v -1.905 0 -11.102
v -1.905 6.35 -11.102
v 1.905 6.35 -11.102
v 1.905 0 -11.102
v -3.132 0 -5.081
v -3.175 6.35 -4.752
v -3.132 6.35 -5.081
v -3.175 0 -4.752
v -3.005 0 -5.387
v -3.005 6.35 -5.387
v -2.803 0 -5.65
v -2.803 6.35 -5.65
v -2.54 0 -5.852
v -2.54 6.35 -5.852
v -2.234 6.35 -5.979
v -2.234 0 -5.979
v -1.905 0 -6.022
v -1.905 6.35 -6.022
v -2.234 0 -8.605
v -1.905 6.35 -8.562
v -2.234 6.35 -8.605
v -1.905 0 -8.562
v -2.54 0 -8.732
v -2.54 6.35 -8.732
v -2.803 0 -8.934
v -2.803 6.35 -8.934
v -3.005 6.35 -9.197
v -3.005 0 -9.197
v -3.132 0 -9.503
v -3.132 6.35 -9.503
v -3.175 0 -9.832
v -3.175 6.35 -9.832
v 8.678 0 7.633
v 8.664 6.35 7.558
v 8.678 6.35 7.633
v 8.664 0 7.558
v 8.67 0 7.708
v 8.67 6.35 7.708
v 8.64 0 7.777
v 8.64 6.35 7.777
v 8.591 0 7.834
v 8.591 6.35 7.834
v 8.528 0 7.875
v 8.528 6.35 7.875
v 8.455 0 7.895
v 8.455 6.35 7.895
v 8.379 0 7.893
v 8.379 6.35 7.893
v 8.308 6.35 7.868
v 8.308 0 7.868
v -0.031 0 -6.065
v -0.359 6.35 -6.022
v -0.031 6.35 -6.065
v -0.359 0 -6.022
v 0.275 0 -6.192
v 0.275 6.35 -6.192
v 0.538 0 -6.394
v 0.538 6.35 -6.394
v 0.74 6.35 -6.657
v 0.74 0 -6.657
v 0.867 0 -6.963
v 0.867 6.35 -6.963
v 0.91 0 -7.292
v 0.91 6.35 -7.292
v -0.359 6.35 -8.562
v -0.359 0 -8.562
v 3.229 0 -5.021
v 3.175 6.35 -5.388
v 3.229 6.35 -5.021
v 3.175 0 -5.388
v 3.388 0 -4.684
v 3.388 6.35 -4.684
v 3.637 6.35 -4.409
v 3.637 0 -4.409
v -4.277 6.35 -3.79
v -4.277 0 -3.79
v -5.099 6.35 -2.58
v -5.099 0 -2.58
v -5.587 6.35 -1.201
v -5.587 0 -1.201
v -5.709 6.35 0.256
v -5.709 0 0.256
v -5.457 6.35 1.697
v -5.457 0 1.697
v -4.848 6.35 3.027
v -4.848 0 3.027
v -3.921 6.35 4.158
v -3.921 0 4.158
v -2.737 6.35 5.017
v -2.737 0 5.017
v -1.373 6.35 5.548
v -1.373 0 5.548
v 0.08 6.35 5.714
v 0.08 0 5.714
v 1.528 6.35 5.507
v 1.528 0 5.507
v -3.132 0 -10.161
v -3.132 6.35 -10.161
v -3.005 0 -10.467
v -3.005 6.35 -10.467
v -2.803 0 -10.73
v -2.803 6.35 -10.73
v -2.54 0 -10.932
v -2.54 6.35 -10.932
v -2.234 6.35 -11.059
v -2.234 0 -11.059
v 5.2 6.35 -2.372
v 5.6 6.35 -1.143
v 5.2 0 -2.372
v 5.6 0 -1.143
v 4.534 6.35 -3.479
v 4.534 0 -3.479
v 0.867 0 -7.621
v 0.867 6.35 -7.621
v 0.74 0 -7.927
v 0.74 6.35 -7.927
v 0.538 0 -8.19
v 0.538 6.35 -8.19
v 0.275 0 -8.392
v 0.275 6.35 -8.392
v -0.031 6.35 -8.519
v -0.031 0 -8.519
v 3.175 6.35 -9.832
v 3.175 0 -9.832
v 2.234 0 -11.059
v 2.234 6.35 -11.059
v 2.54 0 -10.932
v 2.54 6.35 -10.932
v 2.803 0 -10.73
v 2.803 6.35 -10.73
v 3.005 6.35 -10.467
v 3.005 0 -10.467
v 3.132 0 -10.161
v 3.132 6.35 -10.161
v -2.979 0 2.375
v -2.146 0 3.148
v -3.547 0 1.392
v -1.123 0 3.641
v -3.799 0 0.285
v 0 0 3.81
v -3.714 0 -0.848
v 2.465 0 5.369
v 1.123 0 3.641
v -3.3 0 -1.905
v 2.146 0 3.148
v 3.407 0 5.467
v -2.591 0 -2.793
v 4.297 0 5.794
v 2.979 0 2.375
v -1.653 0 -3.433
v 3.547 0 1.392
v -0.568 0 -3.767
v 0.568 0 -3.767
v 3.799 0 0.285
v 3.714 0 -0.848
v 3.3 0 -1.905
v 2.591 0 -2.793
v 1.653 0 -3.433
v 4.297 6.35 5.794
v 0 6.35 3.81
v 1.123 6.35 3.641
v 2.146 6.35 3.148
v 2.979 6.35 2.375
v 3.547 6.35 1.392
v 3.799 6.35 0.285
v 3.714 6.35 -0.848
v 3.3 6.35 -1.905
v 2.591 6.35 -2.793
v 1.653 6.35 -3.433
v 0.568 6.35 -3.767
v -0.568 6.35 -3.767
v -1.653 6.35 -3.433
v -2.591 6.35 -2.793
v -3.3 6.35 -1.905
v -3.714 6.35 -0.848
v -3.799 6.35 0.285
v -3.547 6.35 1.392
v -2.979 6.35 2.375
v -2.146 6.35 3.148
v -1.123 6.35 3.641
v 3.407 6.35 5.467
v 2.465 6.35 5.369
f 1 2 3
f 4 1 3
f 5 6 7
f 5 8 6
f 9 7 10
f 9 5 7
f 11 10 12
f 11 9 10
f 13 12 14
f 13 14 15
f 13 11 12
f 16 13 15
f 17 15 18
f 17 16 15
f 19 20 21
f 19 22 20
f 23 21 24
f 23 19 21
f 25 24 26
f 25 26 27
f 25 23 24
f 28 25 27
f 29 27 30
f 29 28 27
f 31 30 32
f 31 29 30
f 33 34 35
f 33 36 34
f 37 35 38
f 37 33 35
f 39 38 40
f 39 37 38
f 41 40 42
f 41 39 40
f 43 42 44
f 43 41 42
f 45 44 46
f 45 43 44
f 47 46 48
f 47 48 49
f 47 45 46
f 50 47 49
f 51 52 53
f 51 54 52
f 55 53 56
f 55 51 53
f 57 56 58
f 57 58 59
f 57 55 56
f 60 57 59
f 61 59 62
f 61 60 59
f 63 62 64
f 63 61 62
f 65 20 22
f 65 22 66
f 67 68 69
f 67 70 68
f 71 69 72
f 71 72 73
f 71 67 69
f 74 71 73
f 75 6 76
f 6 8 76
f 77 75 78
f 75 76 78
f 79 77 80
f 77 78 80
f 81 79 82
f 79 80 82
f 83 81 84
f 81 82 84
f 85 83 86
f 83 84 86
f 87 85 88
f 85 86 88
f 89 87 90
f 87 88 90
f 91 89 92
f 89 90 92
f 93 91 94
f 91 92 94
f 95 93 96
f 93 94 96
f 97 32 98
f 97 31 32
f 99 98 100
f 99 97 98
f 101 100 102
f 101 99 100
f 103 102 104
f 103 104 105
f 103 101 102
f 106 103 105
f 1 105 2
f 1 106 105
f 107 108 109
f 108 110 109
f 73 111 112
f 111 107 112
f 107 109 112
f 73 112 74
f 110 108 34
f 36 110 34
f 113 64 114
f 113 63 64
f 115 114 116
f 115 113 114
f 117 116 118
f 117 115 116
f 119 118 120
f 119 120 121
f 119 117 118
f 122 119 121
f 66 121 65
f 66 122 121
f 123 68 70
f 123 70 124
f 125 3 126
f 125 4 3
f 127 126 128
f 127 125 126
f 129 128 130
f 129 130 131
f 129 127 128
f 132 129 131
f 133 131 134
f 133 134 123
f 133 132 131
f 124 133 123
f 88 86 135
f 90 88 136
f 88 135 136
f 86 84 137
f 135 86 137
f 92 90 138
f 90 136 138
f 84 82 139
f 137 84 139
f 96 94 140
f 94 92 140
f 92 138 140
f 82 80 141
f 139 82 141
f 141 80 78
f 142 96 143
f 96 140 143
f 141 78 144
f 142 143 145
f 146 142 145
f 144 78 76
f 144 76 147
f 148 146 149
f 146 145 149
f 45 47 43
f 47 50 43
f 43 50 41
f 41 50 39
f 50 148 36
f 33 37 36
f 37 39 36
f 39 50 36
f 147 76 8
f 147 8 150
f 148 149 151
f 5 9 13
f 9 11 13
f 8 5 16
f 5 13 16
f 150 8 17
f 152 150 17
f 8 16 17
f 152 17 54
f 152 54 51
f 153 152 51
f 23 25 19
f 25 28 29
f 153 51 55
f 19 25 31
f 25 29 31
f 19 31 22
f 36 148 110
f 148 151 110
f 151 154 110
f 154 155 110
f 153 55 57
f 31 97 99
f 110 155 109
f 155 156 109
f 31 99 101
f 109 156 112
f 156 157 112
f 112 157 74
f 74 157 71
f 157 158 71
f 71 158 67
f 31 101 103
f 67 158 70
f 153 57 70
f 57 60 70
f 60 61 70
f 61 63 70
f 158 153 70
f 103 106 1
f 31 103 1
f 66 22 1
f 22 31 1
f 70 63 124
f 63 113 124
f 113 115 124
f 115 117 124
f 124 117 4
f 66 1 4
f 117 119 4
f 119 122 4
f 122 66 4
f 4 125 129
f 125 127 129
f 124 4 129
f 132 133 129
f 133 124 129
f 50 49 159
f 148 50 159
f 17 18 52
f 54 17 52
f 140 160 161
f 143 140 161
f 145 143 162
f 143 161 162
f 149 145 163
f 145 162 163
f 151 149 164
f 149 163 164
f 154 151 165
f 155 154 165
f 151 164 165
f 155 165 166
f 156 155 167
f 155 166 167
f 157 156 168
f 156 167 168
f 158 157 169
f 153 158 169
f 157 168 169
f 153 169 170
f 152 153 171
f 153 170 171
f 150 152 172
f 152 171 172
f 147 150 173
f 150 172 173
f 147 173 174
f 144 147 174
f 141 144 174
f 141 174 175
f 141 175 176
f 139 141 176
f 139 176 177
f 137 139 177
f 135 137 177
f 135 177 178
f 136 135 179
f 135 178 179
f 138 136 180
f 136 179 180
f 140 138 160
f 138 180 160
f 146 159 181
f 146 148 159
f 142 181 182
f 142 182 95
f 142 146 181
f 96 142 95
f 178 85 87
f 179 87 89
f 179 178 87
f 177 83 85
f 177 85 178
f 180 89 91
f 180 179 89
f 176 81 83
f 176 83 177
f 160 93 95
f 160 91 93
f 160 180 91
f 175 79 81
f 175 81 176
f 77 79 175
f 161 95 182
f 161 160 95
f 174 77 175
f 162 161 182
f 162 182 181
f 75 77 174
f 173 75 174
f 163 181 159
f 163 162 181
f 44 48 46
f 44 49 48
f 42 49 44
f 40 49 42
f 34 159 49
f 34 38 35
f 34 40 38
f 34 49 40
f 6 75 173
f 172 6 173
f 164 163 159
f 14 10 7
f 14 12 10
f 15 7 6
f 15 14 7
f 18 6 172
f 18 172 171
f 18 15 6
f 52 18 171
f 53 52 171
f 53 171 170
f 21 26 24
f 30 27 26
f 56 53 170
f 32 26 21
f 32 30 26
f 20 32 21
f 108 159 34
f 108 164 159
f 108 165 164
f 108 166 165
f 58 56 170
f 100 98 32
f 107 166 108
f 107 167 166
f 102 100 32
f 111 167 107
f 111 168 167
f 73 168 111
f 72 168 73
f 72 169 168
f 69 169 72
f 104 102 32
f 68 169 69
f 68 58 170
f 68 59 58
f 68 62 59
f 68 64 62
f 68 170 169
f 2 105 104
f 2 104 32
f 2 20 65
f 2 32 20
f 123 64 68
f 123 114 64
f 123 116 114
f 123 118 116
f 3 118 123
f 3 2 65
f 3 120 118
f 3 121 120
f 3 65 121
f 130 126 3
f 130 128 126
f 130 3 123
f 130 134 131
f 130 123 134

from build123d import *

# Parameters (mm, degrees)
SKETCH1_R           = 5.715
BOSS_EXTRUDE1_DEPTH = 6.35
SKETCH3_R           = 3.81
CUT_EXTRUDE1_DEPTH  = 6.35
BOSS_EXTRUDE3_DEPTH = 6.35
FILLET2_R           = 0.254
FILLET3_R           = 3.81
SKETCH4_W           = 6.35
SKETCH4_H           = 6.35
BOSS_EXTRUDE4_DEPTH = 6.35
SKETCH5_W           = 4.085425086
SKETCH5_H           = 2.54
CUT_EXTRUDE2_DEPTH  = 6.35
FILLET4_R           = 1.27


with BuildPart() as part:
    # Sketch1 → Boss-Extrude1 (new body)
    with BuildSketch(Plane(origin=(0, 0, 0), x_dir=(1, 0, 0), z_dir=(0, 1, 0))):
        with Locations(Location((0, 0, 0), (0, 0, 270))):
            Circle(SKETCH1_R)
    extrude(amount=BOSS_EXTRUDE1_DEPTH)

    # Sketch3 → Cut-Extrude1 (cut)
    with BuildSketch(Plane(origin=(0, 6.35, 0), x_dir=(1, 0, 0), z_dir=(0, 1, 0))):
        with Locations(Location((0, 0, 0), (0, 0, 270))):
            Circle(SKETCH3_R)
    extrude(amount=-CUT_EXTRUDE1_DEPTH, mode=Mode.SUBTRACT)

    # Sketch2 → Boss-Extrude3 (add)
    with BuildSketch(Plane(origin=(0, 6.35, 0), x_dir=(1, 0, 0), z_dir=(0, 1, 0))):
        Polygon((5.08, 2.618172072), (8.876921418, -8.162750326), (2.764587199, -5.001827928), align=None)
    extrude(amount=-BOSS_EXTRUDE3_DEPTH)

    # Fillet2
    fillet2_edges = [part.edges().sort_by_distance(p)[0] for p in [
        (8.876921418, 3.175, 8.162750326),
    ]]
    fillet(fillet2_edges, radius=FILLET2_R)

    # Fillet3
    fillet3_edges = [part.edges().sort_by_distance(p)[0] for p in [
        (2.764587199, 3.175, 5.001827928),
    ]]
    fillet(fillet3_edges, radius=FILLET3_R)

    # Sketch4 → Boss-Extrude4 (add)
    with BuildSketch(Plane(origin=(0, 6.35, 0), x_dir=(1, 0, 0), z_dir=(0, 1, 0))):
        with Locations((0, 7.926904881)):
            Rectangle(SKETCH4_W, SKETCH4_H)
    extrude(amount=-BOSS_EXTRUDE4_DEPTH)

    # Sketch5 → Cut-Extrude2 (cut)
    with BuildSketch(Plane(origin=(0, 6.35, 0), x_dir=(1, 0, 0), z_dir=(0, 1, 0))):
        with Locations((-1.132287457, 7.291904881)):
            Rectangle(SKETCH5_W, SKETCH5_H)
    extrude(amount=-CUT_EXTRUDE2_DEPTH, mode=Mode.SUBTRACT)

    # Fillet4
    fillet4_edges = [part.edges().sort_by_distance(p)[0] for p in [
        (3.175, 3.175, -4.751904881),
        (-3.175, 3.175, -6.021904881),
        (0.910425086, 3.175, -6.021904881),
        (0.910425086, 3.175, -8.561904881),
        (-3.175, 3.175, -8.561904881),
        (-3.175, 3.175, -11.101904881),
        (3.175, 3.175, -11.101904881),
    ]]
    fillet(fillet4_edges, radius=FILLET4_R - 0.0001)  # a hair under: the kernel refuses the full size


solid = part.part
